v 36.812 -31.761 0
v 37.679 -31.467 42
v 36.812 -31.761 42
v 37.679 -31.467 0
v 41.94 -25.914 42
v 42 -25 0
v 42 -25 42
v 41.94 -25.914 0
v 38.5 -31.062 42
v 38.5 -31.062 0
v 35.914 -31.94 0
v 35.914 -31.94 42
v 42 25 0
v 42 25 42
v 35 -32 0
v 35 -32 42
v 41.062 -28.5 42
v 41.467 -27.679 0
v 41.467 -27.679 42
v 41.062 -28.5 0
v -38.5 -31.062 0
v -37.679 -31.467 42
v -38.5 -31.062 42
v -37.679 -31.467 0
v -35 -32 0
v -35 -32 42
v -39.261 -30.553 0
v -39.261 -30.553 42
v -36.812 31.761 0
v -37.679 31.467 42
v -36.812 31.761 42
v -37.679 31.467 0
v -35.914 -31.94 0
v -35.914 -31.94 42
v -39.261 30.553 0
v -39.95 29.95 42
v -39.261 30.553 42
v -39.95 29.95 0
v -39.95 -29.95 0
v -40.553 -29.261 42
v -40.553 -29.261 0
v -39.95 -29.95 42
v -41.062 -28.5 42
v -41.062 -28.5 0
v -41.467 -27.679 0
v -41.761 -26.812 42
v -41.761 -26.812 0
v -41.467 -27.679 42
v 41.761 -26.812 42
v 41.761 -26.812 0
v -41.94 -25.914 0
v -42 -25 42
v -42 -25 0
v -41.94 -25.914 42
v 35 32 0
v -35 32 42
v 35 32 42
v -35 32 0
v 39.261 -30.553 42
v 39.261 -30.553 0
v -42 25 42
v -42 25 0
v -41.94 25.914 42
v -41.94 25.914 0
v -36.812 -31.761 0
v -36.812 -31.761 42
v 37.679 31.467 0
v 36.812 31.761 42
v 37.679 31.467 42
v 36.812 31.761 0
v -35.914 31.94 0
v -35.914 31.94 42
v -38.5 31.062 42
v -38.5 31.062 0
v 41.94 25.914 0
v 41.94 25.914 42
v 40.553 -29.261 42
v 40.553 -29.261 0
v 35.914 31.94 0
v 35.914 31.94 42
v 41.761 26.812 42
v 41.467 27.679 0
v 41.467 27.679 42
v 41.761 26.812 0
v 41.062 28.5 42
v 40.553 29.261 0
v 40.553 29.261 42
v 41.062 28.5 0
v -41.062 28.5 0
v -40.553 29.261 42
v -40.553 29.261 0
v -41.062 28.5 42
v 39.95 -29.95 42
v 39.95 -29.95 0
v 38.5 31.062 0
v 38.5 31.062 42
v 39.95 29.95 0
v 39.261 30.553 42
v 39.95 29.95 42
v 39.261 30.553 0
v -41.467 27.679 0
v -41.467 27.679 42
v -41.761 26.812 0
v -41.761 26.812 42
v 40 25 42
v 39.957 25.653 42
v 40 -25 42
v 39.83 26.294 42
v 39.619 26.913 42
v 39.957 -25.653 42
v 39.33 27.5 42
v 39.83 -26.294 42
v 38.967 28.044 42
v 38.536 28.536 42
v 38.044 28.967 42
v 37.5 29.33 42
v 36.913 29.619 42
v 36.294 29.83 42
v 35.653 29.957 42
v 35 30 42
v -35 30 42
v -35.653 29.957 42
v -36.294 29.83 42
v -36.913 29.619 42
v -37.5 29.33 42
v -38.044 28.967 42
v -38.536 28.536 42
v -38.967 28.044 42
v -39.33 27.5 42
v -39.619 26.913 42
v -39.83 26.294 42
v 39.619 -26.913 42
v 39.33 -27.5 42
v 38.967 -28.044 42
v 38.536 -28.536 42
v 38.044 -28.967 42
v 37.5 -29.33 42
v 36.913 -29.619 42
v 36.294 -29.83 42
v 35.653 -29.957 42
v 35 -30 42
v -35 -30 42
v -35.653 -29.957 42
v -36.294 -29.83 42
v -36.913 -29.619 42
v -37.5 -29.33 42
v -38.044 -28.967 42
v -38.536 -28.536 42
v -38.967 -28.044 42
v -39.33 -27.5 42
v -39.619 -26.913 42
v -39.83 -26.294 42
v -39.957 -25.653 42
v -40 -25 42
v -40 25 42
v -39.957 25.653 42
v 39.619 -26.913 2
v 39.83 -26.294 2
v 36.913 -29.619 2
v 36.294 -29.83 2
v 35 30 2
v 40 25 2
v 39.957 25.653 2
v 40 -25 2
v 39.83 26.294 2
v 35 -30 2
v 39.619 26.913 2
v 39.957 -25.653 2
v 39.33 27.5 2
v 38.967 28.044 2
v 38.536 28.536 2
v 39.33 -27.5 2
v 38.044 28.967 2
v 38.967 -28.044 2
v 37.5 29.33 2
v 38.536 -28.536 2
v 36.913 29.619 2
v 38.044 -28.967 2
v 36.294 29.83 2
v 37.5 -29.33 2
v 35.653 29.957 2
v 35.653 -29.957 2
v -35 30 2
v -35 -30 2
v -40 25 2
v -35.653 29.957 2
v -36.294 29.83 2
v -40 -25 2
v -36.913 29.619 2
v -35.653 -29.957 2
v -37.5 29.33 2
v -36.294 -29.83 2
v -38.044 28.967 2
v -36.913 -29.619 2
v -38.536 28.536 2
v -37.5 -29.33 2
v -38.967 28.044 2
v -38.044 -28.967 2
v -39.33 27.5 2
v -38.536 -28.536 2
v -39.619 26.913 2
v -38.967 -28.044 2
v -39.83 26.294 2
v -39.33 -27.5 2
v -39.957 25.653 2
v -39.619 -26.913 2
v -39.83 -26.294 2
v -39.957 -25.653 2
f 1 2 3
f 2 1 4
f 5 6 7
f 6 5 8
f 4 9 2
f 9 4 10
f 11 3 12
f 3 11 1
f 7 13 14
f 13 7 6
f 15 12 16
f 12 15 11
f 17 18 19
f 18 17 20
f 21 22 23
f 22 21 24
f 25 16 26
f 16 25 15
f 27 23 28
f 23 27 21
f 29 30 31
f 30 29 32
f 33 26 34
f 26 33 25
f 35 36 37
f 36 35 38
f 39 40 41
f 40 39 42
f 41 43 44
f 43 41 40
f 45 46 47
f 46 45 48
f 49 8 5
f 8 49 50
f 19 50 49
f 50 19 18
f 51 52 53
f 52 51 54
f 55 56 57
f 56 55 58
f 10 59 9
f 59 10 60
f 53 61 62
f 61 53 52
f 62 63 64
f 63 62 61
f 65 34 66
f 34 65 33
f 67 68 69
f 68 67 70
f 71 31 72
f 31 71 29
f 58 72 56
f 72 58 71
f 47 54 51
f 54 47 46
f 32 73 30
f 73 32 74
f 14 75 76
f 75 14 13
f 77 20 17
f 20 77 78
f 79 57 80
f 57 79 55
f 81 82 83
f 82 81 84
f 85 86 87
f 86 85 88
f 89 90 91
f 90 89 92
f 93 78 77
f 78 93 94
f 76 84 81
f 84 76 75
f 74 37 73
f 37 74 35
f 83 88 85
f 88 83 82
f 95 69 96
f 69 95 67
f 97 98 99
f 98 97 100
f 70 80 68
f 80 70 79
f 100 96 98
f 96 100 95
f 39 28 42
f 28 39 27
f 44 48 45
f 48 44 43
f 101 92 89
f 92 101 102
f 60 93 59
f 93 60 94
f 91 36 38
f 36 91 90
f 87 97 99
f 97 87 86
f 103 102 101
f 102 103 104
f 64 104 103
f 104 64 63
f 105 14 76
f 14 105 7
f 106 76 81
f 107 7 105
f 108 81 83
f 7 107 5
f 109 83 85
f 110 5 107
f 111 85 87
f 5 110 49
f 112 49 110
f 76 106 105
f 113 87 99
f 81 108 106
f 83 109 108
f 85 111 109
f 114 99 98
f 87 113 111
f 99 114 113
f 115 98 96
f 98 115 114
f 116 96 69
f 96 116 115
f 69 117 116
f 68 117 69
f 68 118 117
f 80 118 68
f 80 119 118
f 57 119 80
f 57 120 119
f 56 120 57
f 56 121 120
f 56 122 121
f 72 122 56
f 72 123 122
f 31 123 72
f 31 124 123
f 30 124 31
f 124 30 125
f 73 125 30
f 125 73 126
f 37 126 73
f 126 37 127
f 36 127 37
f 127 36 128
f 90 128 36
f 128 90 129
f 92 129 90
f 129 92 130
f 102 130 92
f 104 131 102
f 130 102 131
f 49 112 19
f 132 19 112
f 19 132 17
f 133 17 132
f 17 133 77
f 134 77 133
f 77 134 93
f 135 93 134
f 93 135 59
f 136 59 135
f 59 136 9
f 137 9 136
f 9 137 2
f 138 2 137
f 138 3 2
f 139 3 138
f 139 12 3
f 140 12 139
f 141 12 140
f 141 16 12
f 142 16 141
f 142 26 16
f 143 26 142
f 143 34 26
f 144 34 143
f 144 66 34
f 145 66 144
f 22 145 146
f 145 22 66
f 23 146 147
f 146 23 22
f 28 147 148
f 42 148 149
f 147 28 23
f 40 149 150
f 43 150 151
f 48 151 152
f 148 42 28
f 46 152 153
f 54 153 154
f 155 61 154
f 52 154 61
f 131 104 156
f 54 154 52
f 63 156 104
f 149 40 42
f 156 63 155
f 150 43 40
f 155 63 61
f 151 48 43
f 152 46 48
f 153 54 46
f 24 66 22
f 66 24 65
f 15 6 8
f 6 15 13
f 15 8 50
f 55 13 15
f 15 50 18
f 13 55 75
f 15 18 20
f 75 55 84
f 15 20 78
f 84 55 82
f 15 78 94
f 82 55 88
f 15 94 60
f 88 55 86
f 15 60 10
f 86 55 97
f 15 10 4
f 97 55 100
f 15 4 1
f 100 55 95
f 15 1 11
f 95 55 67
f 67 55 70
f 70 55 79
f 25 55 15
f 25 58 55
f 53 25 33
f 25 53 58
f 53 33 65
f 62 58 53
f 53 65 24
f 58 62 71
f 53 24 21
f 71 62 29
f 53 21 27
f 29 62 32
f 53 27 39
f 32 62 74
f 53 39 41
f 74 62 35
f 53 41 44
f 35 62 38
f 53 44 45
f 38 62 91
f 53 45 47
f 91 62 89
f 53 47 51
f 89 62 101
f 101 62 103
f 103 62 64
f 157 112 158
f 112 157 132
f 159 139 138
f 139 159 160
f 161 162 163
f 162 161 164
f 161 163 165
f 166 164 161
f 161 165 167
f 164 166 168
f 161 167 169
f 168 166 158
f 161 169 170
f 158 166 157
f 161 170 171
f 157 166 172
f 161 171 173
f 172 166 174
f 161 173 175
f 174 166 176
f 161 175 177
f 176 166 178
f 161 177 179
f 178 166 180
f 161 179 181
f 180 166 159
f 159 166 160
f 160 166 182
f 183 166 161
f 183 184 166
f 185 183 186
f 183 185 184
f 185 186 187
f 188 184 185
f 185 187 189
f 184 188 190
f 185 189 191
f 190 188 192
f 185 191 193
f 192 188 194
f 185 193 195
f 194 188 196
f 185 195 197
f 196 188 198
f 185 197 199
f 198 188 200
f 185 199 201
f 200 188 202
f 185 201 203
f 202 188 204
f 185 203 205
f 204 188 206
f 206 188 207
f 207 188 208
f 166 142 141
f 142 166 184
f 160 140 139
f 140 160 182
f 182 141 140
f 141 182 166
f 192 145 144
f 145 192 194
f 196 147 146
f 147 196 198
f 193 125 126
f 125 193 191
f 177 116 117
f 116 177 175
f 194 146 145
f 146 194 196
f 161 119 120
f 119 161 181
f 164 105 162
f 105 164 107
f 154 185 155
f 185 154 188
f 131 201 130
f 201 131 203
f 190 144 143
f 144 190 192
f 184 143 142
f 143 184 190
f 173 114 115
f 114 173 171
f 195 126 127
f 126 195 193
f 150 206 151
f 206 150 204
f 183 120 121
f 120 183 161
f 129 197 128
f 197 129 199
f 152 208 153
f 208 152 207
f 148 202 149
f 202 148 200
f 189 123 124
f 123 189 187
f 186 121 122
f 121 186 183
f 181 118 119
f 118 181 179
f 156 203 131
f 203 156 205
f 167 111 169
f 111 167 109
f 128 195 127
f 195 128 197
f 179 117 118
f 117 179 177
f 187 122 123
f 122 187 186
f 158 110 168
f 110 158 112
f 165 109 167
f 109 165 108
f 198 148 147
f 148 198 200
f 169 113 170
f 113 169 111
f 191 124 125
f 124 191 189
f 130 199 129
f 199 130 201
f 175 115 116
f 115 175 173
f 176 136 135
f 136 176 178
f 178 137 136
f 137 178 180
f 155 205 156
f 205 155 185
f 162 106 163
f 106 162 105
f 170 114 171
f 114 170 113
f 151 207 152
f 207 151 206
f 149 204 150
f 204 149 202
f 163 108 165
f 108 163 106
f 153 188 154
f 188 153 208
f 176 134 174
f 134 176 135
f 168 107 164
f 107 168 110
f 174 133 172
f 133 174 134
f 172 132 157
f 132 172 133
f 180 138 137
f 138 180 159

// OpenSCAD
// Caixa com tampa de encaixe — modelo próprio do Multiferramenta 3D
// Partes: "caixa" e "tampa" (impressas separadas). Medidas INTERNAS.
largura = 80; profundidade = 60; altura = 40; parede = 2; fundo = 2; raio = 5; folga = 0.25;
texto = ""; fonte = "Poppins:style=Bold"; gravacao = 0.6;
parte = "caixa";
$fn = 48;

module ret(w, d, r) offset(r = max(0.01, r)) offset(delta = -max(0.01, r)) square([w, d], center = true);
aba = 6;            // altura do encaixe da tampa
if (parte == "caixa") difference() {
  linear_extrude(fundo + altura) ret(largura + 2 * parede, profundidade + 2 * parede, raio + parede);
  translate([0, 0, fundo]) linear_extrude(altura + 1) ret(largura, profundidade, raio);
}
else if (parte == "tampa") difference() {
  union() {
    linear_extrude(fundo) ret(largura + 2 * parede, profundidade + 2 * parede, raio + parede);
    translate([0, 0, fundo]) linear_extrude(aba) difference() {             // encaixe que entra na caixa
      ret(largura - 2 * folga, profundidade - 2 * folga, raio - folga); ret(largura - 2 * folga - 2 * 1.2, profundidade - 2 * folga - 2 * 1.2, raio - folga - 1.2);
    }
  }
  if (len(texto) > 0) translate([0, 0, -0.01]) linear_extrude(gravacao) mirror([1, 0]) resize([min(largura * 0.8, len(texto) * 9), 0], auto = true) text(texto, font = fonte, size = 10, halign = "center", valign = "center");
}
